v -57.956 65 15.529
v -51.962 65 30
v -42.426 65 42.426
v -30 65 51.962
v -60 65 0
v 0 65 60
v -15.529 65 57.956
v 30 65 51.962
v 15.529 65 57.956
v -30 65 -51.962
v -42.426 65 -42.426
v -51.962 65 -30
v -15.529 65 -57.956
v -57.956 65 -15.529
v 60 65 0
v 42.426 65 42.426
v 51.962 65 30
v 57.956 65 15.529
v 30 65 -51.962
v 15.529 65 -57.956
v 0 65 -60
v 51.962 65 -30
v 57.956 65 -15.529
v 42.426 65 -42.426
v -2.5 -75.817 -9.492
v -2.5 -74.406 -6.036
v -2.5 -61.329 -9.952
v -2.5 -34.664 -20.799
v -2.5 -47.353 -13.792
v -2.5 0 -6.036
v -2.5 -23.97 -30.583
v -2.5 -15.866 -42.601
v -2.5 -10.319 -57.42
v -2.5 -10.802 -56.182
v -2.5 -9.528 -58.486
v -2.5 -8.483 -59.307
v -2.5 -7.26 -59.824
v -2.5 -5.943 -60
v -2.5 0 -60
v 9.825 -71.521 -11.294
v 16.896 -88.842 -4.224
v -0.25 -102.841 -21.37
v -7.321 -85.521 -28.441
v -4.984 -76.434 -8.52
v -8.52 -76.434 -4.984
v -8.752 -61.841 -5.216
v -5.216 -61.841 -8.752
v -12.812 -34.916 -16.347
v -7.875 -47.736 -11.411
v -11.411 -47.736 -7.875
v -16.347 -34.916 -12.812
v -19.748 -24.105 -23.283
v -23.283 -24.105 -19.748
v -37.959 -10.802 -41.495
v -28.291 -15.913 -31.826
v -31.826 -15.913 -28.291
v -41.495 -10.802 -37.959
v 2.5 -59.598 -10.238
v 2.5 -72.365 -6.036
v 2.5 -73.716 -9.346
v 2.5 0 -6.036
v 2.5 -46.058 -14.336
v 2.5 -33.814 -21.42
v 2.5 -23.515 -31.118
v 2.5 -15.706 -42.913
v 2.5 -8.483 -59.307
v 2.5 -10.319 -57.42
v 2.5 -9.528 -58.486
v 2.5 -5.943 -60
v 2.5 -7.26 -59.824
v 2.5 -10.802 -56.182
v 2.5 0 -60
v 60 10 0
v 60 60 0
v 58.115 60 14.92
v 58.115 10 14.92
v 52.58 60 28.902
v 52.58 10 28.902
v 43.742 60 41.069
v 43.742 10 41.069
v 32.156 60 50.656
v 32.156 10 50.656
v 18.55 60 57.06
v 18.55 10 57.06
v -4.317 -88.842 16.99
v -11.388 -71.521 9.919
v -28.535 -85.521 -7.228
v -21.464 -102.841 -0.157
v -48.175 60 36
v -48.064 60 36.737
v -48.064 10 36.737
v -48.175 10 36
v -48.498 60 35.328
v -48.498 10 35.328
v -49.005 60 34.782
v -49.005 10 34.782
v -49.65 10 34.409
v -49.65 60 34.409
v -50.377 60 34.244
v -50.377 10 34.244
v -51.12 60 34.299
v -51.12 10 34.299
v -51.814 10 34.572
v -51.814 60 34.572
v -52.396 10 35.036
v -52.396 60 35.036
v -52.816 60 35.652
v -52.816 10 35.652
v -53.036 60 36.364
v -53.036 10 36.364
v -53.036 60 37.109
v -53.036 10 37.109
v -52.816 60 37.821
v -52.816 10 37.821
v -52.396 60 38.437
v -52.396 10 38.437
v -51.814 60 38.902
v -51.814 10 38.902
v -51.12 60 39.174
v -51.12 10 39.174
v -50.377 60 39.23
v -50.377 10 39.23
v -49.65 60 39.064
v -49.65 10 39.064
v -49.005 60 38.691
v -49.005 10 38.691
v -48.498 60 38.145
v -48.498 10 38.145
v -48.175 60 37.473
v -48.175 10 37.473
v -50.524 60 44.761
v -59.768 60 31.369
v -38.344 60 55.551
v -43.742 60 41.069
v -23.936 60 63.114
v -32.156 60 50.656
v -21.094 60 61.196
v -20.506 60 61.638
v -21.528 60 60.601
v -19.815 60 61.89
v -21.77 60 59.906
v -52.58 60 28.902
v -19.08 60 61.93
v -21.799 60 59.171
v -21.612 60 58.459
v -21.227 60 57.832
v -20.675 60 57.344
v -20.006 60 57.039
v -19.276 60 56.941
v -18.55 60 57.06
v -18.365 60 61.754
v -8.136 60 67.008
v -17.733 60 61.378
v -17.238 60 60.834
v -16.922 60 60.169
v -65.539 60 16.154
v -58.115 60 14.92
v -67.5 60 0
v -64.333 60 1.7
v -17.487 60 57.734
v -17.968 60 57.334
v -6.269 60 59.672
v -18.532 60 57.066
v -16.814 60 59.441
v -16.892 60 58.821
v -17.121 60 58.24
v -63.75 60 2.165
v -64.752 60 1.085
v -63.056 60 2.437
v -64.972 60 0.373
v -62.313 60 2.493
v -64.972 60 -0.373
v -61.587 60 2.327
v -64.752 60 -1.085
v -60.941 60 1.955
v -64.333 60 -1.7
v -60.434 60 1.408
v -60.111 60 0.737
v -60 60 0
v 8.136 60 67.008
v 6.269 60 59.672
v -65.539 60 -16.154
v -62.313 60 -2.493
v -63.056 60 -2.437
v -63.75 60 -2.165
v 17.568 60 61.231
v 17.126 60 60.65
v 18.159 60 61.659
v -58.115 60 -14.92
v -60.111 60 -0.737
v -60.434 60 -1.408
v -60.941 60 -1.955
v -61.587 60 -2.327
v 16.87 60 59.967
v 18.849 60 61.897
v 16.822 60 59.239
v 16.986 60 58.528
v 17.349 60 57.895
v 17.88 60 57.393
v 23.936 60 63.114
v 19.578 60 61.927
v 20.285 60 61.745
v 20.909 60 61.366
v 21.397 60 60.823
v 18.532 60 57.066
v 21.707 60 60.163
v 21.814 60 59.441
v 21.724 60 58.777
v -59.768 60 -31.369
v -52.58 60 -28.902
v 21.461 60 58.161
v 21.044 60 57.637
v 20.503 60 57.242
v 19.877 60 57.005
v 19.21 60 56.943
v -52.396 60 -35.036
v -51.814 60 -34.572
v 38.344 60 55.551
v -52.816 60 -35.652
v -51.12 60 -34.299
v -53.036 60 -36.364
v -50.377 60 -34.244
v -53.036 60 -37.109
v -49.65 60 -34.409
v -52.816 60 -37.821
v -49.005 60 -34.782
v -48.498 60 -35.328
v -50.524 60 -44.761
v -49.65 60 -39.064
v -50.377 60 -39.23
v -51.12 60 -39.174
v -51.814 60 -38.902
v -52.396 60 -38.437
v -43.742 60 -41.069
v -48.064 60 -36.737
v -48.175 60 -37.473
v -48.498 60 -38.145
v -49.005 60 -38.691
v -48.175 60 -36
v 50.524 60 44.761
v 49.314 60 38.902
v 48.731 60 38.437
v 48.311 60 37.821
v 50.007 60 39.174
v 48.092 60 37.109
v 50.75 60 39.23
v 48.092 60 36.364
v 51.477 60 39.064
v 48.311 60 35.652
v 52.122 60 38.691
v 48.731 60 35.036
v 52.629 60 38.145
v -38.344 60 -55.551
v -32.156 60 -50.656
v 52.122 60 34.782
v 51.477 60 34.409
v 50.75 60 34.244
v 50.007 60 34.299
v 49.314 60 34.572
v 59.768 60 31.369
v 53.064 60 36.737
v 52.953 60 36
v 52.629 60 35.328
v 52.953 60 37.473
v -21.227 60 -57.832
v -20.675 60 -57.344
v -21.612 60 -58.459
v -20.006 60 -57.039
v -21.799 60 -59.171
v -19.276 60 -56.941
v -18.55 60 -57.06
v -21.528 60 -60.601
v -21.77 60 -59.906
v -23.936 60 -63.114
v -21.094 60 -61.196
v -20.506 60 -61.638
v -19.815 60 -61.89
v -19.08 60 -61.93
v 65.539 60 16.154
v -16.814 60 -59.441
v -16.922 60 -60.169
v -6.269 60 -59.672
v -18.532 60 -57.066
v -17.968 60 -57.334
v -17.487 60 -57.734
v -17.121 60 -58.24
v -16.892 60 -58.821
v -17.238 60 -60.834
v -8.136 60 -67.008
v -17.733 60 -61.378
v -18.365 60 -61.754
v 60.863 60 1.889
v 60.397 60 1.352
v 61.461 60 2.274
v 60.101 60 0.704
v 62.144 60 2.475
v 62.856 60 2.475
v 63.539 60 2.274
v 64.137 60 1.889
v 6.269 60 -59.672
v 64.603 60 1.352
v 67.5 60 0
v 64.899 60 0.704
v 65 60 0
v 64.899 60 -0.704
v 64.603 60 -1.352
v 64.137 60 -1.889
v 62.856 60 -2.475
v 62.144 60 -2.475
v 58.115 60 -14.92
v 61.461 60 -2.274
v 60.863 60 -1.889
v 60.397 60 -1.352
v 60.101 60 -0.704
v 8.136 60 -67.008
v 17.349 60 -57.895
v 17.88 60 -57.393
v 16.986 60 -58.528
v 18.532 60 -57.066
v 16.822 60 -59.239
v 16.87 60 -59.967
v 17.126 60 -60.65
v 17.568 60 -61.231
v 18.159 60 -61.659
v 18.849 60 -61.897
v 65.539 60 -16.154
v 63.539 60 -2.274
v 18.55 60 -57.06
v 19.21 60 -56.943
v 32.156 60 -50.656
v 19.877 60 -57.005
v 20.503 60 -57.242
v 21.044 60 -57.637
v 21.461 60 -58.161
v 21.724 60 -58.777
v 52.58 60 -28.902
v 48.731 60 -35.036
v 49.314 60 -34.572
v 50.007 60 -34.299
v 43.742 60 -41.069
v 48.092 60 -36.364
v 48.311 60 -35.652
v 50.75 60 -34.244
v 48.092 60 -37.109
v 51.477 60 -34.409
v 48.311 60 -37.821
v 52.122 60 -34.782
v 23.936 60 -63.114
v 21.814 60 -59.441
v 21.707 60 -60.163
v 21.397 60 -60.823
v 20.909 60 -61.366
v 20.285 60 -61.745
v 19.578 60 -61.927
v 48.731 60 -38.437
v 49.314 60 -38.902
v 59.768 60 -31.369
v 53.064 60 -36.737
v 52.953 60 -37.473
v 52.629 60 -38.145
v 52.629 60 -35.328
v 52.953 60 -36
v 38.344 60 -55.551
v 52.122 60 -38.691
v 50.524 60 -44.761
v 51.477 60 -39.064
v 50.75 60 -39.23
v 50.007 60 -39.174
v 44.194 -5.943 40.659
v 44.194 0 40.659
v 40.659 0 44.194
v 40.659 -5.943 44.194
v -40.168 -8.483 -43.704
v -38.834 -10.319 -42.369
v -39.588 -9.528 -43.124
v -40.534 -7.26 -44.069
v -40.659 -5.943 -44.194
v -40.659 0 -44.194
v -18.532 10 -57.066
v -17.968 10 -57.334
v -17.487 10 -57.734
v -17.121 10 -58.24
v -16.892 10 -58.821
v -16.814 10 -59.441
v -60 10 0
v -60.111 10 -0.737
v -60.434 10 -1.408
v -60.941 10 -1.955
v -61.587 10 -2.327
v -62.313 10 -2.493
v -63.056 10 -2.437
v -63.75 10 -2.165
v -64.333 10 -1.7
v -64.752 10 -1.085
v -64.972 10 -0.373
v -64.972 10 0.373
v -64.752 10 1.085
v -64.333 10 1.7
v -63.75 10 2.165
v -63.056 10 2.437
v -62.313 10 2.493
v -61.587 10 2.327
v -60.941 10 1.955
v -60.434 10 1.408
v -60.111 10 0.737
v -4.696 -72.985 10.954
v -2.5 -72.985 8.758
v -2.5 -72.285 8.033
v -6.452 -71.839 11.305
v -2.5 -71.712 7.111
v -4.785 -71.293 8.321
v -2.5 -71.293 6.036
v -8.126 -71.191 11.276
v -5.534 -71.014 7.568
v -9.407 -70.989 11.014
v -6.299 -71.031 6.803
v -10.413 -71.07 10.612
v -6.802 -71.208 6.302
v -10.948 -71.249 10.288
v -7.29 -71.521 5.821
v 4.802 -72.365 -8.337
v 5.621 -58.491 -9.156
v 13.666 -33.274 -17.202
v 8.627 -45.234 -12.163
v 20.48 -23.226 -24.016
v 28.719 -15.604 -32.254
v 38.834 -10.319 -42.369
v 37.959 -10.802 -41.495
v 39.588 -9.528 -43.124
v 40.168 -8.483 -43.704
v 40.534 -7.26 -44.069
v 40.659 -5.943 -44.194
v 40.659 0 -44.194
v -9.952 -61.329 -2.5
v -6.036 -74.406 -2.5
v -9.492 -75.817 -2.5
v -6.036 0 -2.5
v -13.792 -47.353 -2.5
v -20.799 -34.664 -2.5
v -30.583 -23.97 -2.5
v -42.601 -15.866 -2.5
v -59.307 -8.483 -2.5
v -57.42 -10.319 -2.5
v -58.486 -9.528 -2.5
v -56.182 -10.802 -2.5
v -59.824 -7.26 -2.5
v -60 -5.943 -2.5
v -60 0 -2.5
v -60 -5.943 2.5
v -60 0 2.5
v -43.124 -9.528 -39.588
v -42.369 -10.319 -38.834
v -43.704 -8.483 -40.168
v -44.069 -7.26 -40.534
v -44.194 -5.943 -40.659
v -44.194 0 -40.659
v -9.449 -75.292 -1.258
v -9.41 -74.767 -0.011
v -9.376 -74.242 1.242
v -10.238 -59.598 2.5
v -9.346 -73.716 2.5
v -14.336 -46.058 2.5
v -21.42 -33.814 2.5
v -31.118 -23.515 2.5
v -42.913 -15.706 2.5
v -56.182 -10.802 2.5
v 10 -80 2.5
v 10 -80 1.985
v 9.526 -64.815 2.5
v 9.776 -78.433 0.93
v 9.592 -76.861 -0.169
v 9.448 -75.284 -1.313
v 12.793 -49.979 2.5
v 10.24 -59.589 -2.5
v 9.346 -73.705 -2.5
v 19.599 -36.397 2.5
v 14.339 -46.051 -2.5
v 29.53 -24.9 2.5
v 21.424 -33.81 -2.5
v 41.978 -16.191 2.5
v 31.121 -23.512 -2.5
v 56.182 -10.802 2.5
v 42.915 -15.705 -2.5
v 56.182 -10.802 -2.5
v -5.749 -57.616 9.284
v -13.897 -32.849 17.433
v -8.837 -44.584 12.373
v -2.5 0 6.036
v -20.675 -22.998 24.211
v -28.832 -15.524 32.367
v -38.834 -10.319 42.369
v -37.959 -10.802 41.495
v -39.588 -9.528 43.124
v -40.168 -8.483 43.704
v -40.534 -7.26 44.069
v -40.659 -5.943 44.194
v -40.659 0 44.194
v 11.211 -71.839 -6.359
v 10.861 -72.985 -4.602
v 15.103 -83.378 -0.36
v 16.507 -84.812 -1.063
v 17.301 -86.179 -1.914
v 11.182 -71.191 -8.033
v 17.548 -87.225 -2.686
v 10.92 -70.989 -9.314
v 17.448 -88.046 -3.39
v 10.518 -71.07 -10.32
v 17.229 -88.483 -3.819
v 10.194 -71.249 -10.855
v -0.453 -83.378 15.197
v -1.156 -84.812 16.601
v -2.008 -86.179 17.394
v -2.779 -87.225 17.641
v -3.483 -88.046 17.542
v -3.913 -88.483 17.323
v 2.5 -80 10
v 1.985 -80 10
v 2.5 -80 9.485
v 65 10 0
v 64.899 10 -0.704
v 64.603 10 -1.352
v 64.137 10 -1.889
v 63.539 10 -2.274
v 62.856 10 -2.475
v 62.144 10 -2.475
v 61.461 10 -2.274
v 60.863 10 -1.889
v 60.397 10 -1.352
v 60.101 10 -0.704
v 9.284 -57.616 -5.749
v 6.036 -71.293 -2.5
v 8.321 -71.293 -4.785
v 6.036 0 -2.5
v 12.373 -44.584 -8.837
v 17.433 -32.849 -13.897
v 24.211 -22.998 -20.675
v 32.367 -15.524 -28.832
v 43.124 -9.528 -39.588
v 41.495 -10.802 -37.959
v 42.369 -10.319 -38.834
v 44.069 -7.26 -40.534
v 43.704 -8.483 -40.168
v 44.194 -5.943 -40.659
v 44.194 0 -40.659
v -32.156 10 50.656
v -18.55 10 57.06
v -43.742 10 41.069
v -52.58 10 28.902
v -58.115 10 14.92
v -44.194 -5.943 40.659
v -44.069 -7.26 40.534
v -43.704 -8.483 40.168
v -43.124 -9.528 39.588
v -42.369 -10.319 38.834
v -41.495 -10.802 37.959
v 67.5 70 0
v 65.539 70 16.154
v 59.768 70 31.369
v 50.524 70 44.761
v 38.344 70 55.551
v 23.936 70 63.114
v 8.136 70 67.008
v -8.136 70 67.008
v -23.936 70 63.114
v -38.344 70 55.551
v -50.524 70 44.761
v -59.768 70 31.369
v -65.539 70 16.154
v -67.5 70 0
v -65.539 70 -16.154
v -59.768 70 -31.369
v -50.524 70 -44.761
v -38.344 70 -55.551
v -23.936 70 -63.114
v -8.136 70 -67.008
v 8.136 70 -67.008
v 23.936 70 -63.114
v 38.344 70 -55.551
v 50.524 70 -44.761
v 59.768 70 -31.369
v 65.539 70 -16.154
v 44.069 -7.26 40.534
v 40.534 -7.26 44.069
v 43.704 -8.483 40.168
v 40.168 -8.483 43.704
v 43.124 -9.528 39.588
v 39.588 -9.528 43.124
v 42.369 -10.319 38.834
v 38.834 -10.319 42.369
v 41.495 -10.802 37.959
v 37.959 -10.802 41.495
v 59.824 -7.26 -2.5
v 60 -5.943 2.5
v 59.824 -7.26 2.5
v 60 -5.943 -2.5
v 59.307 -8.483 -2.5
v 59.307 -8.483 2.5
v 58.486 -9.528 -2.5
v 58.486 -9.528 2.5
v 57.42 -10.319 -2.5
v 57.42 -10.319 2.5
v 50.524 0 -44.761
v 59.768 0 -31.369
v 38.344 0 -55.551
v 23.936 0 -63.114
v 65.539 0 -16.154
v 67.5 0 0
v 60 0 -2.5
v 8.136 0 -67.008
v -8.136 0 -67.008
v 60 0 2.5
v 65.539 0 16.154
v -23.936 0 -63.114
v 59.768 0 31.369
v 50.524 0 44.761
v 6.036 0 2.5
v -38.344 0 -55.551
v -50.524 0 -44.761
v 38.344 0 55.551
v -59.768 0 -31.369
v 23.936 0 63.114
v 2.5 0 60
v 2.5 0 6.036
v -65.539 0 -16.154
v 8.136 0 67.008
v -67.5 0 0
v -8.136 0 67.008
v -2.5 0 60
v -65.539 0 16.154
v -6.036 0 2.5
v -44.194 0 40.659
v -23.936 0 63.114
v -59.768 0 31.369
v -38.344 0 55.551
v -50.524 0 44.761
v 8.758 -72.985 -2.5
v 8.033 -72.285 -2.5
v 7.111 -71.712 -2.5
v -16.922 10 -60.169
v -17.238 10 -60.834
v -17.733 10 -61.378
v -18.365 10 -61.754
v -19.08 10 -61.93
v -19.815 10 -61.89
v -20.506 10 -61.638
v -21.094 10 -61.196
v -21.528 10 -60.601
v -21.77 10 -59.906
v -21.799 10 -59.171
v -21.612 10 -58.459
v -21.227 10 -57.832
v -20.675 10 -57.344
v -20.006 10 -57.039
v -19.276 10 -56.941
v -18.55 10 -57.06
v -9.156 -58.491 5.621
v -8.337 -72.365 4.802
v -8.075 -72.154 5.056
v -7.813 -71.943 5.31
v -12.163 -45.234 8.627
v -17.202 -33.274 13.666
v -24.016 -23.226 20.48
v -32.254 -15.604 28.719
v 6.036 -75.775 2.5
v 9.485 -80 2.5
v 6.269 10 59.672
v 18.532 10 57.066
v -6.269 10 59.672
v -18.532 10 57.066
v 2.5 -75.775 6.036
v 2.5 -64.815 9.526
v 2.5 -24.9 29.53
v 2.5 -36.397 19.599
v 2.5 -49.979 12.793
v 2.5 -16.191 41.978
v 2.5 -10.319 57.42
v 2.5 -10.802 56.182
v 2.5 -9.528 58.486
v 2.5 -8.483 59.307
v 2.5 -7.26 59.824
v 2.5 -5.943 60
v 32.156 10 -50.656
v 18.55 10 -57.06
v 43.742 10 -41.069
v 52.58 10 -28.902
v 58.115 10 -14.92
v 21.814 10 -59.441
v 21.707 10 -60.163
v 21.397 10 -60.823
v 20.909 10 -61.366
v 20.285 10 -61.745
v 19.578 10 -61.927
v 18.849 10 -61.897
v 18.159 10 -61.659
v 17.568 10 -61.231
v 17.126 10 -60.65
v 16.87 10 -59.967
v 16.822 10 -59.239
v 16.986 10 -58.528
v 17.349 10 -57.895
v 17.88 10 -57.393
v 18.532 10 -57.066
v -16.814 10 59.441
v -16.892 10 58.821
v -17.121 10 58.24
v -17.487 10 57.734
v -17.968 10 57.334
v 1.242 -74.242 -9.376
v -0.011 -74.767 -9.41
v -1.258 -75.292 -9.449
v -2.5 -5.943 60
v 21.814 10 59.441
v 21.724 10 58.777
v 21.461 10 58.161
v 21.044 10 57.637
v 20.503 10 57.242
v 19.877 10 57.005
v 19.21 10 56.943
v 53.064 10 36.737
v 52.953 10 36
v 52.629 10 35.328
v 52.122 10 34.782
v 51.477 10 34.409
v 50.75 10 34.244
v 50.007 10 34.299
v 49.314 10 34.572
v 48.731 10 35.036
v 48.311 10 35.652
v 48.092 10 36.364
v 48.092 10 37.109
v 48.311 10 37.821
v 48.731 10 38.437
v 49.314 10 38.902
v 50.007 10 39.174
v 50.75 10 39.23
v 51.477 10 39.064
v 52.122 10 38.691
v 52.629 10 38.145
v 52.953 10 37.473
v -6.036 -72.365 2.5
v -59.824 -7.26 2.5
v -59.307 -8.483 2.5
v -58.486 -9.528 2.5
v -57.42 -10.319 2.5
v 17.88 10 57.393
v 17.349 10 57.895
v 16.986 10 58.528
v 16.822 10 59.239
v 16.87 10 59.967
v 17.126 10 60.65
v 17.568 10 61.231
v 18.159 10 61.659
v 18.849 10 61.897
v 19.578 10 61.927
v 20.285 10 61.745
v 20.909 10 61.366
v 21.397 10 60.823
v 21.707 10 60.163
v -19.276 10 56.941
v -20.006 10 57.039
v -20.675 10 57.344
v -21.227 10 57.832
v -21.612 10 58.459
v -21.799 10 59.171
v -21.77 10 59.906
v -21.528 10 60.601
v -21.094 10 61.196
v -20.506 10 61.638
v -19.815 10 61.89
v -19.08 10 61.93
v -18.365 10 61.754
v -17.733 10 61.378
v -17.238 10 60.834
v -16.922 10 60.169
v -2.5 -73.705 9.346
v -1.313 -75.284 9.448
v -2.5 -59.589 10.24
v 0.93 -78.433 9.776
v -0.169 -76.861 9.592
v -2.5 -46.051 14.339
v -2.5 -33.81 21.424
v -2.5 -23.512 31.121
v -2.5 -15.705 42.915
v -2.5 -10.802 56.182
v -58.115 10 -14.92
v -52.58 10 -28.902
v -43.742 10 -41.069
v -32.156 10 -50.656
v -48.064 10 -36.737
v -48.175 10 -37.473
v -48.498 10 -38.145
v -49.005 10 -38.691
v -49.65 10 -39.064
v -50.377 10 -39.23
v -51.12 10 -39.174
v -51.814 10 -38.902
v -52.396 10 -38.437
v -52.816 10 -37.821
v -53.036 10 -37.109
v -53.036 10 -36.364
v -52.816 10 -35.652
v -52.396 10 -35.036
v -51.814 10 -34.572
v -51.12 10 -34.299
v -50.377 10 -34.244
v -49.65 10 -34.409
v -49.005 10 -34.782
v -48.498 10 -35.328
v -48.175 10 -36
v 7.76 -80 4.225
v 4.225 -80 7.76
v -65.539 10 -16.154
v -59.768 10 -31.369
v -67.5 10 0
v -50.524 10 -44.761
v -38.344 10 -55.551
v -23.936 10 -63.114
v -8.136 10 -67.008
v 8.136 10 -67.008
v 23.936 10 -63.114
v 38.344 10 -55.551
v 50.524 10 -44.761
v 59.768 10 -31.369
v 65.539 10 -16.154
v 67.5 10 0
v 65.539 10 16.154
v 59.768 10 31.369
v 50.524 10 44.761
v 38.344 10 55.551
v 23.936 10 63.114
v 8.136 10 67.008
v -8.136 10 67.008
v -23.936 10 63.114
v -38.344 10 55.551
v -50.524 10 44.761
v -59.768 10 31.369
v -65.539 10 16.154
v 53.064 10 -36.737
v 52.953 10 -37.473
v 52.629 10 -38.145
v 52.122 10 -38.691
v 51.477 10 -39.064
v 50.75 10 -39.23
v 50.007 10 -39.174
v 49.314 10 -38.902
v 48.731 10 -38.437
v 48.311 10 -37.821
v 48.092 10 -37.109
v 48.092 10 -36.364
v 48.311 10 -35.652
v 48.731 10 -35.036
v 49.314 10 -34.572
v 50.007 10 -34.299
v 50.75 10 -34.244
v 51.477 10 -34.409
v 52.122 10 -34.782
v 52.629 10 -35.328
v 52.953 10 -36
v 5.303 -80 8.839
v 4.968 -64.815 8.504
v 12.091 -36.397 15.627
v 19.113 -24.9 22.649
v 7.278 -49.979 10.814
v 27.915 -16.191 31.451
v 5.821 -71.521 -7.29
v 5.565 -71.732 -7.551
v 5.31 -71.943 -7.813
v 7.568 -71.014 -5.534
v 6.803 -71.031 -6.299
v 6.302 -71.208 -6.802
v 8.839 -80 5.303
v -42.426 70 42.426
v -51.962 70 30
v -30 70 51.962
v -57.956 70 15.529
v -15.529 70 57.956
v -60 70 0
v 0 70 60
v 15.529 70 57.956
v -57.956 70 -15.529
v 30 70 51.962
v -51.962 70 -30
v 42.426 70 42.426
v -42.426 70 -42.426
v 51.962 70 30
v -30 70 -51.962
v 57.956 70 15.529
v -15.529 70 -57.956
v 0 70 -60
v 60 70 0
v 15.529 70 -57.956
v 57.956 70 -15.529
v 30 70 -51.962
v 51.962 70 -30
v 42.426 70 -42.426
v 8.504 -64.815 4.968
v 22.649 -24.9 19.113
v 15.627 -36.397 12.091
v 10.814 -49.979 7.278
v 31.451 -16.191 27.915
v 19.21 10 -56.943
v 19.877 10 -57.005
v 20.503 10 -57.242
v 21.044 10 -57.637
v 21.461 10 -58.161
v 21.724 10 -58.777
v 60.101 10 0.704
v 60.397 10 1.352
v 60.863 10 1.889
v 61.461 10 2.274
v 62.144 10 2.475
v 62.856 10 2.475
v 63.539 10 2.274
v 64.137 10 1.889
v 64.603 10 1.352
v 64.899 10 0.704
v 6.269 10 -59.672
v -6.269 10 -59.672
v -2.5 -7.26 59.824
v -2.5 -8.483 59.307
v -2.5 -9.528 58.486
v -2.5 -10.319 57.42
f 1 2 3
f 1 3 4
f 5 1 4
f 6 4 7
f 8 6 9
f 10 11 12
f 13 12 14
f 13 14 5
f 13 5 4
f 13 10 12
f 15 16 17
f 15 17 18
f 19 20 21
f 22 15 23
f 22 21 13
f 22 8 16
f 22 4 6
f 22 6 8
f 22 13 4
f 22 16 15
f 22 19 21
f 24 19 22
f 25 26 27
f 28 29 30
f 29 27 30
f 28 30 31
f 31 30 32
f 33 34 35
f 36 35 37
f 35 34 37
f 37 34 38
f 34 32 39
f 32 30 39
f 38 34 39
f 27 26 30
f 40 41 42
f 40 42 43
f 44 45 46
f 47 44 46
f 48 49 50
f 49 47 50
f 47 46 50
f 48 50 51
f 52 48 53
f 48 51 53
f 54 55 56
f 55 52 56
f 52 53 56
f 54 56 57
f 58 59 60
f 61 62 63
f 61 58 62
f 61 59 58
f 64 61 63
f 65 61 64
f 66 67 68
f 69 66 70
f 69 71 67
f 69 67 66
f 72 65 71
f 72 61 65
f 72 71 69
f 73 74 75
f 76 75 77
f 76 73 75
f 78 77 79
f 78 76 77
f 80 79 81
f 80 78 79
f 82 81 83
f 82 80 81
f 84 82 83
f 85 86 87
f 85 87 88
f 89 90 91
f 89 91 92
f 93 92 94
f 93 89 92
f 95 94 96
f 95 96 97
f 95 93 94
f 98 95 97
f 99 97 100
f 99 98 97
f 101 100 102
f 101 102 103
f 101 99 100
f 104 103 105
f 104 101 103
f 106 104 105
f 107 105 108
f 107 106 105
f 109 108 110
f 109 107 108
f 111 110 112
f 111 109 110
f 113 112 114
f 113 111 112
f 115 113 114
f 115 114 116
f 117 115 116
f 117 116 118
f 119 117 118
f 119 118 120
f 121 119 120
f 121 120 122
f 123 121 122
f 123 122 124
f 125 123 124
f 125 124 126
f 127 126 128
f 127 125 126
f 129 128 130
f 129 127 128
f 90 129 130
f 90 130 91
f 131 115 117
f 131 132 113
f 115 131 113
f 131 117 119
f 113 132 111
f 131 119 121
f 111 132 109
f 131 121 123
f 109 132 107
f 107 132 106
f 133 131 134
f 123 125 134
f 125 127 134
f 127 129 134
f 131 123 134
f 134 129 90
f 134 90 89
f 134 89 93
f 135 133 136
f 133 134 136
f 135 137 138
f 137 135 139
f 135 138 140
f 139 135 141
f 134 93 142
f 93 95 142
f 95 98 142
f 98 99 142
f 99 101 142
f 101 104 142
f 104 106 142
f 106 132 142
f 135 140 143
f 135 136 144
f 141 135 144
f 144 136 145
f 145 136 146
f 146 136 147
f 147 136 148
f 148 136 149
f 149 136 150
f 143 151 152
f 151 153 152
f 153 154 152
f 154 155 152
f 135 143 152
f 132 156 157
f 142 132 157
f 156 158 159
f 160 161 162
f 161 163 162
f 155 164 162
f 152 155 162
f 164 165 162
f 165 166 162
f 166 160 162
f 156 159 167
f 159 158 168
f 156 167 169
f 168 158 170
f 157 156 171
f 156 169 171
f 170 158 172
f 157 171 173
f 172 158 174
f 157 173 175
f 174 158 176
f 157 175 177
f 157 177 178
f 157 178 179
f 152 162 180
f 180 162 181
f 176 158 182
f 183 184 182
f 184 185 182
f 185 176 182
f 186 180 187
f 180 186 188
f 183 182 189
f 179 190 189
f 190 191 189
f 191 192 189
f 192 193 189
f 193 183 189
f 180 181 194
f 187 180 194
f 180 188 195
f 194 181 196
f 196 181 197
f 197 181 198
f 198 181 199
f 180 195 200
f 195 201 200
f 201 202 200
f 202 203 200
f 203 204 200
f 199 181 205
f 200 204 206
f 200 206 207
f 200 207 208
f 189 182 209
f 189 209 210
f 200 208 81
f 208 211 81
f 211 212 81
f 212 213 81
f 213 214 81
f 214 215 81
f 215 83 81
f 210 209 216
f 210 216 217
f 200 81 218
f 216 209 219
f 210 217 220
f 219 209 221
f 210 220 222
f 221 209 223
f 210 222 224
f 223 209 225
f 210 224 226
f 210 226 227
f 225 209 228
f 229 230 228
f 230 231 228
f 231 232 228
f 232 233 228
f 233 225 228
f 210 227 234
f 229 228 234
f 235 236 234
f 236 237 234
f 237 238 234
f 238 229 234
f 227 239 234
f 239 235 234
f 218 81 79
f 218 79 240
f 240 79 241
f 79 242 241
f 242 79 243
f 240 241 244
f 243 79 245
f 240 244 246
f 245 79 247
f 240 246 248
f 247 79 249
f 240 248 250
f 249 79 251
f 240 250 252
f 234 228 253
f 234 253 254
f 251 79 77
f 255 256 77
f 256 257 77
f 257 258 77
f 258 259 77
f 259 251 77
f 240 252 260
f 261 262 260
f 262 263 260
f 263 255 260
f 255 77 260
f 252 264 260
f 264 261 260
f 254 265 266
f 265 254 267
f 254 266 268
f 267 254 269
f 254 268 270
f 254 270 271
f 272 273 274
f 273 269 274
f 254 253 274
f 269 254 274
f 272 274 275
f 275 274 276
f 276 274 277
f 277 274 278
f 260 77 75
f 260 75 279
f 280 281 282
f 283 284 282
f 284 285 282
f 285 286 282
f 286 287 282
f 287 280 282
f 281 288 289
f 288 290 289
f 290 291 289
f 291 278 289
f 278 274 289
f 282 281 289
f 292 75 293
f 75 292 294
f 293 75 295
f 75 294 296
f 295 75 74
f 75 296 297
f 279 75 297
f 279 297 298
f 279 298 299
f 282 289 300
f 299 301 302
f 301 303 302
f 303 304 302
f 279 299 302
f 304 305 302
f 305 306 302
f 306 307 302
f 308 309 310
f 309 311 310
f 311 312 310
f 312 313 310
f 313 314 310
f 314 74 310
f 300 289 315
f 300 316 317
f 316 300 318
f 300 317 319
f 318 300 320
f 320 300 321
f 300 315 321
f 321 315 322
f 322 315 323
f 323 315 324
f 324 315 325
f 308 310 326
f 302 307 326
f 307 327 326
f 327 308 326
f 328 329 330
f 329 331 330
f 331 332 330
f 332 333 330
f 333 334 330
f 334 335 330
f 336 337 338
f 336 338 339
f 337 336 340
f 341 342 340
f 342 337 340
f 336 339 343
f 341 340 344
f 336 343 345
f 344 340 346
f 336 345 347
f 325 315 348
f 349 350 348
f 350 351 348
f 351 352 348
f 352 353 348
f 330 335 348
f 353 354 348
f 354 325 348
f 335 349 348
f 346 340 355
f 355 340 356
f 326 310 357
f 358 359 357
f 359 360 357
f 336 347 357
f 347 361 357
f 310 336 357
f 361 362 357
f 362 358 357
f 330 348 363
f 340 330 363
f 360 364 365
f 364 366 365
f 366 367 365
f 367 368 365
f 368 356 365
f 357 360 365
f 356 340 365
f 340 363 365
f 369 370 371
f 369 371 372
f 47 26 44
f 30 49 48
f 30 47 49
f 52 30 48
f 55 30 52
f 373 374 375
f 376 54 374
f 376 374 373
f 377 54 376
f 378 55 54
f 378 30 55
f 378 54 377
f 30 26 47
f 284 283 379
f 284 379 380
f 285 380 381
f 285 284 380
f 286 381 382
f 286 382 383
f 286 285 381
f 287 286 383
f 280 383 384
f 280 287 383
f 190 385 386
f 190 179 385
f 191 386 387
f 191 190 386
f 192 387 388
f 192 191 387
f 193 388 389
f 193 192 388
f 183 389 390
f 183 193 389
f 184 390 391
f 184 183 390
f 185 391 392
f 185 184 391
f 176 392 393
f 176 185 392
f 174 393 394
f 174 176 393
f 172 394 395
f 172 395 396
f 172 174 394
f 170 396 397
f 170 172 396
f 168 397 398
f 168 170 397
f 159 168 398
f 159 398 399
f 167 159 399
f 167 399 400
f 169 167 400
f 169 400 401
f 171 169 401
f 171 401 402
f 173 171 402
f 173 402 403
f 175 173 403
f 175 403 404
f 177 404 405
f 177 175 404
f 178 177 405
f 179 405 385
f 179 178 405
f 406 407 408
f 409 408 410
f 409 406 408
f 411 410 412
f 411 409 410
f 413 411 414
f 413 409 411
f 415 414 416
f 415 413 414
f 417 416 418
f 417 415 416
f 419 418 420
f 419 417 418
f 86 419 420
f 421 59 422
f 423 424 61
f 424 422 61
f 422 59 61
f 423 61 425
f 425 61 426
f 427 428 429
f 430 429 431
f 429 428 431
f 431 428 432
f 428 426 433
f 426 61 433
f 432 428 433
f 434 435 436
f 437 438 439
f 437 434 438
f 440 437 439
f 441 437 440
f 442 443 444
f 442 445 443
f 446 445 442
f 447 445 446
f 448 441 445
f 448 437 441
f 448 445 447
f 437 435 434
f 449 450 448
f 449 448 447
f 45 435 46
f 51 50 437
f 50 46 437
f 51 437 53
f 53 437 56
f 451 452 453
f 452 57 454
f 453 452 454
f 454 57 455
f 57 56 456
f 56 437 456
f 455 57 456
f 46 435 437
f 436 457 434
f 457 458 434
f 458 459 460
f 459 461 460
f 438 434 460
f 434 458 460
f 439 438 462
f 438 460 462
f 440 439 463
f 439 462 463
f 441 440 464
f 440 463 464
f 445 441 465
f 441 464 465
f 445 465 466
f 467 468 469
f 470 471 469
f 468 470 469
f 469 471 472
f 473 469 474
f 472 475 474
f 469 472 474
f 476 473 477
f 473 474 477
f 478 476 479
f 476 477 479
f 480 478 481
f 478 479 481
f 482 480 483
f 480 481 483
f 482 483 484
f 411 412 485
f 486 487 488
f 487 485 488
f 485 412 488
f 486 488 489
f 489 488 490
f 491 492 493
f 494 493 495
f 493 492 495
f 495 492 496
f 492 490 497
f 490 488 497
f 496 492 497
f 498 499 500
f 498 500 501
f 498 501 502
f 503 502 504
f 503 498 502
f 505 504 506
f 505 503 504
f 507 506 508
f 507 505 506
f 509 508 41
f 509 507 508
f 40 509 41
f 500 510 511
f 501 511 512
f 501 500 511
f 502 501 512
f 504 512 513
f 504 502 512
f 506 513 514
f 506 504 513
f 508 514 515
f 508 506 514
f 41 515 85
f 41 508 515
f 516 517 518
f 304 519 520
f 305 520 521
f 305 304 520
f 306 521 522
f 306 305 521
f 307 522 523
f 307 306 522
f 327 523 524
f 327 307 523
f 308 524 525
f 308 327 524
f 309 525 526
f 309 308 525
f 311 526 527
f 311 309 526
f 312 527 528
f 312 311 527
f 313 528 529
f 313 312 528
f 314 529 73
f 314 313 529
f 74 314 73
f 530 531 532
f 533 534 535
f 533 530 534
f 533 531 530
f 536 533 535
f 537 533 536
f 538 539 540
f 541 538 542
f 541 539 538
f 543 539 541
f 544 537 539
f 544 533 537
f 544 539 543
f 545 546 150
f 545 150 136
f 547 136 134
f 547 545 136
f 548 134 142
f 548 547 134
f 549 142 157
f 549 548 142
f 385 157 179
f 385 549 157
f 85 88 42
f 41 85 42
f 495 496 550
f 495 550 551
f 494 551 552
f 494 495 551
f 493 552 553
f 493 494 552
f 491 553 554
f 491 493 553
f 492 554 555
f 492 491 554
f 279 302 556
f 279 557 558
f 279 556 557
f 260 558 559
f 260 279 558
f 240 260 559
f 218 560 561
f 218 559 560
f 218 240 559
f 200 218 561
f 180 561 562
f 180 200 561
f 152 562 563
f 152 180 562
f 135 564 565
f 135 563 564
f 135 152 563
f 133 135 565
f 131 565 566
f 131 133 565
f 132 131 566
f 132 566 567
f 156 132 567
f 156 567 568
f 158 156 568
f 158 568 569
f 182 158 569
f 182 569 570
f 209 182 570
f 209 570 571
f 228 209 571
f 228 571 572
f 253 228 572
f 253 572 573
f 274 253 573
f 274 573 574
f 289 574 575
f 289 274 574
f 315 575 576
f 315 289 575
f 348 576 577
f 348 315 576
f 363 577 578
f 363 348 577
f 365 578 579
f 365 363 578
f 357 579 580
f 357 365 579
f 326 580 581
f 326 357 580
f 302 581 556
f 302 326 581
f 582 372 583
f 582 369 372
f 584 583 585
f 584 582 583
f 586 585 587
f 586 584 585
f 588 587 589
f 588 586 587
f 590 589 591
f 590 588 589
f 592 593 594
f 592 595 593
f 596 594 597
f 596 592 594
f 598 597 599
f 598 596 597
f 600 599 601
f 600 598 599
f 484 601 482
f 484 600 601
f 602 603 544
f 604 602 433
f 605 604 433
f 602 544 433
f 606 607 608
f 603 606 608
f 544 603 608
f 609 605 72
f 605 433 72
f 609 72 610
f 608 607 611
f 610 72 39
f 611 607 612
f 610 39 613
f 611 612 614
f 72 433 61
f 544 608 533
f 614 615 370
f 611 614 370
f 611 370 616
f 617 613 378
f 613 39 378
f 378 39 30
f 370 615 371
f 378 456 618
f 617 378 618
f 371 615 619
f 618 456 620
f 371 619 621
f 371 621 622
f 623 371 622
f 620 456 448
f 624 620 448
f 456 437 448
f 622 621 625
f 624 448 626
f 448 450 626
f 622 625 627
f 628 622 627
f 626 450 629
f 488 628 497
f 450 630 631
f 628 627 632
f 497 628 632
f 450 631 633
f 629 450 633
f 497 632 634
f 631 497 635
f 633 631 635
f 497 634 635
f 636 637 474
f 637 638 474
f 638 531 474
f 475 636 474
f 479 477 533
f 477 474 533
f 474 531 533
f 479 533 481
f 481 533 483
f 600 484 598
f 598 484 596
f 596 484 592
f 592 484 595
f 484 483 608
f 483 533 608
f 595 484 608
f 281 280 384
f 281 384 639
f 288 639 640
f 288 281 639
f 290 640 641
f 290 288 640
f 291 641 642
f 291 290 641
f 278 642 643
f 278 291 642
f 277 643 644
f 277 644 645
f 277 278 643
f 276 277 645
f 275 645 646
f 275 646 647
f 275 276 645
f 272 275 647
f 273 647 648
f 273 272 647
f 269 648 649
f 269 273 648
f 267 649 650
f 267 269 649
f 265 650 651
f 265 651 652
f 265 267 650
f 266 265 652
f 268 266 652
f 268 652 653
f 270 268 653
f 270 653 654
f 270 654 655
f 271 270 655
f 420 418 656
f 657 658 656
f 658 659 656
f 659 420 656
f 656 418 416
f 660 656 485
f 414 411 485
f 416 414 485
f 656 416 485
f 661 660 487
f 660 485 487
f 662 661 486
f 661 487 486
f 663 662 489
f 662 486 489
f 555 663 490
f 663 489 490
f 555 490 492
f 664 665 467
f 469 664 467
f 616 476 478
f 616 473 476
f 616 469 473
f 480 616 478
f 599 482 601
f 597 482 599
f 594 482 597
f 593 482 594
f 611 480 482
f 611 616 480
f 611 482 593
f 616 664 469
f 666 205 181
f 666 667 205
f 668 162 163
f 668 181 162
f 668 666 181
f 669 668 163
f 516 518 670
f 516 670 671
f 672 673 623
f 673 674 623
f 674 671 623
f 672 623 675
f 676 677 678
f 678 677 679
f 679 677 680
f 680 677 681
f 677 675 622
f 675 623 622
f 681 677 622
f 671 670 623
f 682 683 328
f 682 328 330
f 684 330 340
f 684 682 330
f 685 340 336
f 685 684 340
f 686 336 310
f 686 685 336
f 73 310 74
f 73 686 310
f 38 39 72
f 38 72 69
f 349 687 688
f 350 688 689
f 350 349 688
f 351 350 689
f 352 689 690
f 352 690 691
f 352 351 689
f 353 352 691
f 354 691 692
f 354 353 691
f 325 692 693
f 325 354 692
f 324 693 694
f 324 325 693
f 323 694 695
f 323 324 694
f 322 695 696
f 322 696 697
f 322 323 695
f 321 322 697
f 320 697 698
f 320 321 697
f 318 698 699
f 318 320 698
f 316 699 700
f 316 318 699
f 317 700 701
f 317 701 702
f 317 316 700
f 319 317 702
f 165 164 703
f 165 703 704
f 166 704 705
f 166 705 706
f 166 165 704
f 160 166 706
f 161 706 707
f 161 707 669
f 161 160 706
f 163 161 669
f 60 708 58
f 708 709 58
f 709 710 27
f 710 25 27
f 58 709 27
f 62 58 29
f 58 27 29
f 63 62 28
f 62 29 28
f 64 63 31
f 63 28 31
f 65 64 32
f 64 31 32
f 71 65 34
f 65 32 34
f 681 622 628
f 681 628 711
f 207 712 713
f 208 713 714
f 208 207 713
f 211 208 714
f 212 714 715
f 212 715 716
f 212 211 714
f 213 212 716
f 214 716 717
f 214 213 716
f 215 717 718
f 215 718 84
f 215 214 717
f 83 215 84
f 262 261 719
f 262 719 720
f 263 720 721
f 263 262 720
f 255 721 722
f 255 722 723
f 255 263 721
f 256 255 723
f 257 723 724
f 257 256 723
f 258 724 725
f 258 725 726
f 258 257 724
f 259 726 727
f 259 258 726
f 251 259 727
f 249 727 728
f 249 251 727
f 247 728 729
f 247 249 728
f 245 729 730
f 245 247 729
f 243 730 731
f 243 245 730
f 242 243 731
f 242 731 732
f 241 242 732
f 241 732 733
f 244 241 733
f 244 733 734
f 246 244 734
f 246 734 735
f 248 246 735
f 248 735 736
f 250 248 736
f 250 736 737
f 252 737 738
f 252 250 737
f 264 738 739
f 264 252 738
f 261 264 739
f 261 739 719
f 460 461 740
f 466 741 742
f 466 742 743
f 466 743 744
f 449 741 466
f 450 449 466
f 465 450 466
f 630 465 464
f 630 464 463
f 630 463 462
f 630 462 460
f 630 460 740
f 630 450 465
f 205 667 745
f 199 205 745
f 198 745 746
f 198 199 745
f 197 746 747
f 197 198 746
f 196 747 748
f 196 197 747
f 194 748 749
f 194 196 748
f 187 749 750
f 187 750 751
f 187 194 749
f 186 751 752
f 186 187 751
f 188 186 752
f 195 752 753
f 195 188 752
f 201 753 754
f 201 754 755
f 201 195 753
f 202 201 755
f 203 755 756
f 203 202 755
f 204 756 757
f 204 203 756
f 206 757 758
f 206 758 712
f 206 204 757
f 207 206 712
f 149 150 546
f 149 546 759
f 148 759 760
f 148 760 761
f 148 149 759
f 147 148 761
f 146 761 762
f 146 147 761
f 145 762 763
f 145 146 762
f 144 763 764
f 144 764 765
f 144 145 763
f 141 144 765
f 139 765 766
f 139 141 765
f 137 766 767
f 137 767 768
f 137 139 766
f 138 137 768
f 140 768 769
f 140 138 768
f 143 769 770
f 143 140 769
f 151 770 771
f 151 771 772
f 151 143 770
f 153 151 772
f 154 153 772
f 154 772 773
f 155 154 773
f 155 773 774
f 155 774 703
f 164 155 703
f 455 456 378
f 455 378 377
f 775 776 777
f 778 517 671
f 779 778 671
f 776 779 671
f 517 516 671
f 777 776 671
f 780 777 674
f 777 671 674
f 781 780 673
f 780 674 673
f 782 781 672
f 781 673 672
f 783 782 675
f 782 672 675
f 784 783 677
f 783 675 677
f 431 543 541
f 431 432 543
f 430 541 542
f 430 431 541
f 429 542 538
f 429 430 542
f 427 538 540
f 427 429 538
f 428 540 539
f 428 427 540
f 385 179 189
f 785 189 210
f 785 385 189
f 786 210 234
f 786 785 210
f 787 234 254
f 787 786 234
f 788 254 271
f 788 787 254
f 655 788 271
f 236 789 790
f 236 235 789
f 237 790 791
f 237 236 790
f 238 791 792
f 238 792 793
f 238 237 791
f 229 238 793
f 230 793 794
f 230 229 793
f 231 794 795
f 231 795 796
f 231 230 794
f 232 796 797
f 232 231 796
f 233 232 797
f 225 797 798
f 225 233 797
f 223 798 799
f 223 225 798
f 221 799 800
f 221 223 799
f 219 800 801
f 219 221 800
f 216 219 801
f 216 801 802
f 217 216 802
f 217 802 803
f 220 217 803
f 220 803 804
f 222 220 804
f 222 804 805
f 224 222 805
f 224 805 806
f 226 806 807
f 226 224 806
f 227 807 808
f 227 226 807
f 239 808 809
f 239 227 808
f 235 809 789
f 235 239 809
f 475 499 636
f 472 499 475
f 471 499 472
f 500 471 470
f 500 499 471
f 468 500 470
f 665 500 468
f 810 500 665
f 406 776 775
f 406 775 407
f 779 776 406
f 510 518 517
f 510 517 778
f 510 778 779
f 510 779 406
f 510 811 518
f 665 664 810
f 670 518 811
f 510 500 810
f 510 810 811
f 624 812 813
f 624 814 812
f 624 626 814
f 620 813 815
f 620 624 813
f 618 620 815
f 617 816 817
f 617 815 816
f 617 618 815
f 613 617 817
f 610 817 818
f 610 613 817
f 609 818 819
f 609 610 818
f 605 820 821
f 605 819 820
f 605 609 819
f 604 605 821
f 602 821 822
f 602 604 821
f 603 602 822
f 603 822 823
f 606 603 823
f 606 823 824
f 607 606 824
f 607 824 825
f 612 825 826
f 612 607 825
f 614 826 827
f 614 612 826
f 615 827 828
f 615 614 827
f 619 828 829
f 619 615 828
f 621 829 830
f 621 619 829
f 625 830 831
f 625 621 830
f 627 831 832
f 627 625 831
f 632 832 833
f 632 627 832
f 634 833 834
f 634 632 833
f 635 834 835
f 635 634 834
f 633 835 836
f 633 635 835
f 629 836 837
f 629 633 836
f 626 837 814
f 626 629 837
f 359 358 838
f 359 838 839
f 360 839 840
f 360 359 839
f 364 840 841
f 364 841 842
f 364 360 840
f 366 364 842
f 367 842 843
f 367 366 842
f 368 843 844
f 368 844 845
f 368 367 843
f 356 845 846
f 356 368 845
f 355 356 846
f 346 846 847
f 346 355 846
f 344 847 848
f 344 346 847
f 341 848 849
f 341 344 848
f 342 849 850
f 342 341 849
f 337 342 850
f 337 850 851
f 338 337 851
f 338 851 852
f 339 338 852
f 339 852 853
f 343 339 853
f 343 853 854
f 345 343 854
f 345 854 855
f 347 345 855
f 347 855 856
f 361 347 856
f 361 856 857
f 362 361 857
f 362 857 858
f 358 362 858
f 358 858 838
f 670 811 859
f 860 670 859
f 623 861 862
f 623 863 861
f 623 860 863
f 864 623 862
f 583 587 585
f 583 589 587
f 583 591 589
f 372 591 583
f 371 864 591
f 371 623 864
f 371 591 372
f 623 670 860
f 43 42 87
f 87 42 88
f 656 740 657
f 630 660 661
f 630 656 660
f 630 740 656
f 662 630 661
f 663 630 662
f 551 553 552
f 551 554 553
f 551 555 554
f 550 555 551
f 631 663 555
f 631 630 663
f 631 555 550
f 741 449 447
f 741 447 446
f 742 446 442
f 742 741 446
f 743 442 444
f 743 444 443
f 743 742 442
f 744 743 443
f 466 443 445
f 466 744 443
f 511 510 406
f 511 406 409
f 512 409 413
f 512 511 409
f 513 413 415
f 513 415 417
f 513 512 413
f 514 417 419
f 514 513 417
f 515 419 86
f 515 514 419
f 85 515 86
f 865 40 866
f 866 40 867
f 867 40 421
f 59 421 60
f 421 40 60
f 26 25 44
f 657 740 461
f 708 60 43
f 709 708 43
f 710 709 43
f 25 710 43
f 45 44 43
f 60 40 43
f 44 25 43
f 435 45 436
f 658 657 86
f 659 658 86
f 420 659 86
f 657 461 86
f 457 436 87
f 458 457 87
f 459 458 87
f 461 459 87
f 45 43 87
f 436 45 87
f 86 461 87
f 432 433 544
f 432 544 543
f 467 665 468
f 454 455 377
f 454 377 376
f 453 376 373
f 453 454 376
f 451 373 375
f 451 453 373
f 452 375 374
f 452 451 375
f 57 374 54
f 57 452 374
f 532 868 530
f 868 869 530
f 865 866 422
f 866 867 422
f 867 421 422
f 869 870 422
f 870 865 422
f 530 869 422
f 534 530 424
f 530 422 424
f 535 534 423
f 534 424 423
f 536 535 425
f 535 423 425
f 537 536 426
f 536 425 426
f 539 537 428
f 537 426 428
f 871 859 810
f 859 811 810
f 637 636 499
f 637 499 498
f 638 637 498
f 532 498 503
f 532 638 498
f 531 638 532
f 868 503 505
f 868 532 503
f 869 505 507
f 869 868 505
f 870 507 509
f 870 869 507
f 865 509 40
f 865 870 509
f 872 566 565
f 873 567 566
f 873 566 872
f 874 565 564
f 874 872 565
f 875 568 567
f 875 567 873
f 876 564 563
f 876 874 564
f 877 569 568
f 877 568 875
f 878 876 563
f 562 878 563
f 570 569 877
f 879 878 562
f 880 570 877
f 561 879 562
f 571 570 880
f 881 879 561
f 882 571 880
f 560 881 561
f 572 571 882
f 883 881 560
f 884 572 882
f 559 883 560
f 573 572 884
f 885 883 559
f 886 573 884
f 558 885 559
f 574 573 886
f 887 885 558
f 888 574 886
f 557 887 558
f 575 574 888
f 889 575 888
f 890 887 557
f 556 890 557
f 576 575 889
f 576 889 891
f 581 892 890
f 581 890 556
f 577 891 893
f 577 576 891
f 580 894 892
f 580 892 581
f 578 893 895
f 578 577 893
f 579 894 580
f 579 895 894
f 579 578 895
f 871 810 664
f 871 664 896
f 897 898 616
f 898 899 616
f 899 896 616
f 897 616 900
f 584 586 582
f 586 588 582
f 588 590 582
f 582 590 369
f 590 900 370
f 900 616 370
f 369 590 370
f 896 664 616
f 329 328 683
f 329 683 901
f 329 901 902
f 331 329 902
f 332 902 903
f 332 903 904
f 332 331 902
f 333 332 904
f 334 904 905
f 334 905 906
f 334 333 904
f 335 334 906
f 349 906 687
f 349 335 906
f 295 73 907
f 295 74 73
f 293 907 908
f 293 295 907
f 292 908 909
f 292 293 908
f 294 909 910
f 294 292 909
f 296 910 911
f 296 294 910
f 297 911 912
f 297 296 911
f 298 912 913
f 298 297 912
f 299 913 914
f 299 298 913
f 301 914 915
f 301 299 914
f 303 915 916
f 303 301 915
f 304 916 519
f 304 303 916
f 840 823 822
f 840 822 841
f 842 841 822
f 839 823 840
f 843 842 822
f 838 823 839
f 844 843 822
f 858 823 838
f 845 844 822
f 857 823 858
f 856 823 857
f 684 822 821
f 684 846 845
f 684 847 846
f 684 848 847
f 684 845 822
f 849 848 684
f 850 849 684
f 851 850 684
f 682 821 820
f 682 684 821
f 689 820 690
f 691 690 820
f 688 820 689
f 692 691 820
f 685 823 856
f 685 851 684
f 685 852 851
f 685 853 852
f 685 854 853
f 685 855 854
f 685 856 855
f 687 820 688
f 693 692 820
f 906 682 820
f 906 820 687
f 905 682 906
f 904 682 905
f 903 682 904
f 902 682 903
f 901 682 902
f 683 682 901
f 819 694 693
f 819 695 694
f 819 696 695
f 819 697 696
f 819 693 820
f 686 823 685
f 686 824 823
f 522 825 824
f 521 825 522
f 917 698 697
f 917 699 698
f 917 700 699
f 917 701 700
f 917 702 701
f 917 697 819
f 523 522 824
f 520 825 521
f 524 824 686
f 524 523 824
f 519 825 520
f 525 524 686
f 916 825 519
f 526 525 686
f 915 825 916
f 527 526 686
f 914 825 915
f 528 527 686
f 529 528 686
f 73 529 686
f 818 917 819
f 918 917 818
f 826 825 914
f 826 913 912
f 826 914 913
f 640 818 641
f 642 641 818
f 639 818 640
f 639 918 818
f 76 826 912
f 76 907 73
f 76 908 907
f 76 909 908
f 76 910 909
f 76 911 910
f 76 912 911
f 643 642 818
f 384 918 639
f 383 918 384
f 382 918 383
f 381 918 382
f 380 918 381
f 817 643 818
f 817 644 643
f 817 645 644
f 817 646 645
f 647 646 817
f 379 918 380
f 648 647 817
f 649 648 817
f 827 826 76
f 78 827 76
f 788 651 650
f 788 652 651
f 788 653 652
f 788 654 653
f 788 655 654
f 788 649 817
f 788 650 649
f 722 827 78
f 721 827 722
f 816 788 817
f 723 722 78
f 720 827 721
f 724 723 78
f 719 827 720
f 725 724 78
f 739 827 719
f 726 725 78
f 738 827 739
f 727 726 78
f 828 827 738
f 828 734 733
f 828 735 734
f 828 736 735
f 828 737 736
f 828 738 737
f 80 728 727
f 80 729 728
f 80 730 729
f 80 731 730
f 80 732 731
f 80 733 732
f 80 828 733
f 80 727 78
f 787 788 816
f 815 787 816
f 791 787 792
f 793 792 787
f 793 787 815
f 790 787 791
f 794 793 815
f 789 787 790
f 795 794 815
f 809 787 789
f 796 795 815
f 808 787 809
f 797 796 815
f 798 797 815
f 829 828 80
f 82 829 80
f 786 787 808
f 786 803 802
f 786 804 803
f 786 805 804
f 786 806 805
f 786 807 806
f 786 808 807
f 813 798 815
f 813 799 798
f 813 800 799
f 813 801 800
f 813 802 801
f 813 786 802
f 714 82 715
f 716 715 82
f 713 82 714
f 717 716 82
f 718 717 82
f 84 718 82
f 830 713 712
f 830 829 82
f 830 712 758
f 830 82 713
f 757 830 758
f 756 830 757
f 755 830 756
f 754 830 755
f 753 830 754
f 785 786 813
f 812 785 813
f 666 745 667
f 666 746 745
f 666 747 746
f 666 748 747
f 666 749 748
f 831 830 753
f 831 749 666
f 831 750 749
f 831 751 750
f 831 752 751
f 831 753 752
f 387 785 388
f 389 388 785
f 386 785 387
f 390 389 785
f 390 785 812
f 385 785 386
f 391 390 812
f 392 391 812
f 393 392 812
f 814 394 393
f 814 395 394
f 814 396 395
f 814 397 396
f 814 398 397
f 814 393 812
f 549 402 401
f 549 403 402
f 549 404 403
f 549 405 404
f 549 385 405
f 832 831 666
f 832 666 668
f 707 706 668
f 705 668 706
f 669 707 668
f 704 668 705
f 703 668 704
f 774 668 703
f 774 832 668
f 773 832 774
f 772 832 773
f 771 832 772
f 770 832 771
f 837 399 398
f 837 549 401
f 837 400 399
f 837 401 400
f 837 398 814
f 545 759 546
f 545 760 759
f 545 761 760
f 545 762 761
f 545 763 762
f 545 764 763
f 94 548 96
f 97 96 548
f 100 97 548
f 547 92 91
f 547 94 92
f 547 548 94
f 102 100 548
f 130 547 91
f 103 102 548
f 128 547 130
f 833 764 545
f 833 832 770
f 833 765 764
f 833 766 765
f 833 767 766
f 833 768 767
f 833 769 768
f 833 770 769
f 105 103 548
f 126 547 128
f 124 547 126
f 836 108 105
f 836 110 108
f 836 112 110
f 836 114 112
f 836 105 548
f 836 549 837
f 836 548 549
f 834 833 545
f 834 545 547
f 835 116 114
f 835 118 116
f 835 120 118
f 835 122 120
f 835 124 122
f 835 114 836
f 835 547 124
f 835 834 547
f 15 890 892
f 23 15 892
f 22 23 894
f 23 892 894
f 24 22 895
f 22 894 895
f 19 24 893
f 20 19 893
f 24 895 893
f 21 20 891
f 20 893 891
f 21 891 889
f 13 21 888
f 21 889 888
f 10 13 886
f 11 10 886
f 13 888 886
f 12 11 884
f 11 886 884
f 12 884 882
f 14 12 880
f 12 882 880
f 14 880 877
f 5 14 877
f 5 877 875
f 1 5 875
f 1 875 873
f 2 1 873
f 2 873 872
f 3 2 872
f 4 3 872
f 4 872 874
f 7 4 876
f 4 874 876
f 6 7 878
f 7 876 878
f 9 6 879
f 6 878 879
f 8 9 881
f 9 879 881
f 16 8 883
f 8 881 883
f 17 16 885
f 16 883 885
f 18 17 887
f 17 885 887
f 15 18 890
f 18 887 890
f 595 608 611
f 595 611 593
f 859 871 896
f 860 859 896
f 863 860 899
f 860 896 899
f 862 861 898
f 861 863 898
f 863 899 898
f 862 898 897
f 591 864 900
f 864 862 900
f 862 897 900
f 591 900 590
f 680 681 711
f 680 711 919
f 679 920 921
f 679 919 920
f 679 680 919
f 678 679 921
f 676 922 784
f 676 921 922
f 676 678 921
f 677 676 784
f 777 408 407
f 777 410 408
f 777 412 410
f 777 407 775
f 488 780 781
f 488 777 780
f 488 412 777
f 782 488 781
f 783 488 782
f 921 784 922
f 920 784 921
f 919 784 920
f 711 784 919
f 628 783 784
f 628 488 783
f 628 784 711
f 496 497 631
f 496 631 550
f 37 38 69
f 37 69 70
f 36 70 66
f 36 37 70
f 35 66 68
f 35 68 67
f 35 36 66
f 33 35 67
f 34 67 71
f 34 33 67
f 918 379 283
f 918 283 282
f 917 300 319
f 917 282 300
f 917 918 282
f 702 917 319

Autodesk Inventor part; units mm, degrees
ref_plane "YZ Plane" through (0, 0, 0) normal (1, 0, 0) x (0, 1, 0)
ref_plane "XZ Plane" through (0, 0, 0) normal (0, 1, 0) x (-1, 0, 0)
sketch "Sketch1" plane through (0, 0, 0) normal (0, 1, 0) x (-1, 0, 0)
  circle A0 centre (0, 0) radius 67.5
  dimension "d0" = 135
extrude "Extrusion1" add sketch "Sketch1" along normal blind 10
sketch "Sketch2" plane through (0, 10, 0) normal (0, 1, 0) x (1, 0, 0)
  circle A0 centre (0, 0) radius 60
  dimension "d3" = 120
extrude "Extrusion2" add sketch "Sketch2" along normal blind 50
sketch "Sketch4" plane through (0, 60, 0) normal (0, 1, 0) x (1, 0, 0)
  circle A0 centre (0, 0) radius 67.5
  dimension "d7" = 135
extrude "Extrusion3" add sketch "Sketch4" along normal blind 10
sketch "Sketch5" plane through (0, 70, 0) normal (0, 1, 0) x (1, 0, 0)
  circle A0 centre (62.5, 0) radius 2.5
  circle A1 centre (50.5636, 36.7366) radius 2.5
  circle A2 centre (19.3136, 59.441) radius 2.5
  circle A3 centre (-19.3136, 59.441) radius 2.5
  circle A4 centre (-50.5636, 36.7366) radius 2.5
  circle A5 centre (-62.5, 0) radius 2.5
  circle A6 centre (-50.5636, -36.7366) radius 2.5
  circle A7 centre (-19.3136, -59.441) radius 2.5
  circle A8 centre (19.3136, -59.441) radius 2.5
  circle A9 centre (50.5636, -36.7366) radius 2.5
  point P0 (0, 0)
  point P1 (0, 0)
  point P2 (0, 0)
  point P3 (0, 0)
  point P4 (0, 0)
  point P5 (0, 0)
  point P6 (0, 0)
  point P7 (0, 0)
  point P8 (0, 0)
  point P9 (0, 0)
  dimension "d10" = 5
  dimension "d13" = 360
extrude "Extrusion4" add sketch "Sketch5" against normal blind 70
sketch "Sketch6" plane through (0, 0, 0) normal (0, 0, 1) x (1, 0, 0)
  line L0 (0, 0) -> (60, 0)
  line L1 (60, 0) -> (60, -10)
  line L2 (-67.5, 0) -> (67.5, 0) projected
  line L3 (0, 0) -> (0, -80)
  line L4 (0, -80) -> (10, -80)
  arc A0 (60, -10) -> (10, -80) centre (70.7099, -70.5071) ccw
  dimension "d17" = 60
  dimension "d18" = 10
  dimension "d20" = 80
  dimension "d21" = 10
extrude "Extrusion5" add sketch "Sketch6" along normal mid plane 5
pattern_circular "Circular Pattern1" count 8 over 360 about axis through (0, -10, 0) along (0, 1, 0) of "Extrusion5"
ref_plane "Work Plane1" through (-7.0711, -80, -7.0711) normal (0.6124, 0.5, 0.6124) x (-0.7071, 0, 0.7071)
sketch "Sketch7" plane through (-7.0711, -80, -7.0711) normal (0.6124, 0.5, 0.6124) x (-0.7071, 0, 0.7071)
  line L0 (15.0661, 17.1375) -> (-14.9339, 17.1375)
  line L1 (-14.9339, 17.1375) -> (-14.9339, -2.8625)
  line L2 (-14.9339, -2.8625) -> (15.0661, -2.8625)
  line L3 (15.0661, -2.8625) -> (15.0661, 17.1375)
  dimension "d28" = 30
  dimension "d29" = 20
extrude "Extrusion6" add sketch "Sketch7" along normal mid plane 32
fillet "Fillet1" radius 4 5 edges at (15.8102, -78.1812, -5.3095) (8.7391, -86.8415, 8.8327) (-5.403, -78.1812, 15.9037) (-6.8894, -69.521, 10.319) (10.2723, -69.521, -6.8426)
fillet "Fillet2" radius 5 8 edges at (-42.4264, -10, -42.4264) (0, -10, -60) (-60, -10, 0) (42.4264, -10, -42.4264) (-42.4264, -10, 42.4264) (0, -10, 60) (42.4264, -10, 42.4264) (60, -10, 0)
sketch "Sketch8" plane through (0, 70, 0) normal (0, 1, 0) x (1, 0, 0)
  circle A0 centre (0, 0) radius 60
  dimension "d34" = 120
extrude "Extrusion7" cut sketch "Sketch8" against normal blind 5
properties part number "ladosredondo"
